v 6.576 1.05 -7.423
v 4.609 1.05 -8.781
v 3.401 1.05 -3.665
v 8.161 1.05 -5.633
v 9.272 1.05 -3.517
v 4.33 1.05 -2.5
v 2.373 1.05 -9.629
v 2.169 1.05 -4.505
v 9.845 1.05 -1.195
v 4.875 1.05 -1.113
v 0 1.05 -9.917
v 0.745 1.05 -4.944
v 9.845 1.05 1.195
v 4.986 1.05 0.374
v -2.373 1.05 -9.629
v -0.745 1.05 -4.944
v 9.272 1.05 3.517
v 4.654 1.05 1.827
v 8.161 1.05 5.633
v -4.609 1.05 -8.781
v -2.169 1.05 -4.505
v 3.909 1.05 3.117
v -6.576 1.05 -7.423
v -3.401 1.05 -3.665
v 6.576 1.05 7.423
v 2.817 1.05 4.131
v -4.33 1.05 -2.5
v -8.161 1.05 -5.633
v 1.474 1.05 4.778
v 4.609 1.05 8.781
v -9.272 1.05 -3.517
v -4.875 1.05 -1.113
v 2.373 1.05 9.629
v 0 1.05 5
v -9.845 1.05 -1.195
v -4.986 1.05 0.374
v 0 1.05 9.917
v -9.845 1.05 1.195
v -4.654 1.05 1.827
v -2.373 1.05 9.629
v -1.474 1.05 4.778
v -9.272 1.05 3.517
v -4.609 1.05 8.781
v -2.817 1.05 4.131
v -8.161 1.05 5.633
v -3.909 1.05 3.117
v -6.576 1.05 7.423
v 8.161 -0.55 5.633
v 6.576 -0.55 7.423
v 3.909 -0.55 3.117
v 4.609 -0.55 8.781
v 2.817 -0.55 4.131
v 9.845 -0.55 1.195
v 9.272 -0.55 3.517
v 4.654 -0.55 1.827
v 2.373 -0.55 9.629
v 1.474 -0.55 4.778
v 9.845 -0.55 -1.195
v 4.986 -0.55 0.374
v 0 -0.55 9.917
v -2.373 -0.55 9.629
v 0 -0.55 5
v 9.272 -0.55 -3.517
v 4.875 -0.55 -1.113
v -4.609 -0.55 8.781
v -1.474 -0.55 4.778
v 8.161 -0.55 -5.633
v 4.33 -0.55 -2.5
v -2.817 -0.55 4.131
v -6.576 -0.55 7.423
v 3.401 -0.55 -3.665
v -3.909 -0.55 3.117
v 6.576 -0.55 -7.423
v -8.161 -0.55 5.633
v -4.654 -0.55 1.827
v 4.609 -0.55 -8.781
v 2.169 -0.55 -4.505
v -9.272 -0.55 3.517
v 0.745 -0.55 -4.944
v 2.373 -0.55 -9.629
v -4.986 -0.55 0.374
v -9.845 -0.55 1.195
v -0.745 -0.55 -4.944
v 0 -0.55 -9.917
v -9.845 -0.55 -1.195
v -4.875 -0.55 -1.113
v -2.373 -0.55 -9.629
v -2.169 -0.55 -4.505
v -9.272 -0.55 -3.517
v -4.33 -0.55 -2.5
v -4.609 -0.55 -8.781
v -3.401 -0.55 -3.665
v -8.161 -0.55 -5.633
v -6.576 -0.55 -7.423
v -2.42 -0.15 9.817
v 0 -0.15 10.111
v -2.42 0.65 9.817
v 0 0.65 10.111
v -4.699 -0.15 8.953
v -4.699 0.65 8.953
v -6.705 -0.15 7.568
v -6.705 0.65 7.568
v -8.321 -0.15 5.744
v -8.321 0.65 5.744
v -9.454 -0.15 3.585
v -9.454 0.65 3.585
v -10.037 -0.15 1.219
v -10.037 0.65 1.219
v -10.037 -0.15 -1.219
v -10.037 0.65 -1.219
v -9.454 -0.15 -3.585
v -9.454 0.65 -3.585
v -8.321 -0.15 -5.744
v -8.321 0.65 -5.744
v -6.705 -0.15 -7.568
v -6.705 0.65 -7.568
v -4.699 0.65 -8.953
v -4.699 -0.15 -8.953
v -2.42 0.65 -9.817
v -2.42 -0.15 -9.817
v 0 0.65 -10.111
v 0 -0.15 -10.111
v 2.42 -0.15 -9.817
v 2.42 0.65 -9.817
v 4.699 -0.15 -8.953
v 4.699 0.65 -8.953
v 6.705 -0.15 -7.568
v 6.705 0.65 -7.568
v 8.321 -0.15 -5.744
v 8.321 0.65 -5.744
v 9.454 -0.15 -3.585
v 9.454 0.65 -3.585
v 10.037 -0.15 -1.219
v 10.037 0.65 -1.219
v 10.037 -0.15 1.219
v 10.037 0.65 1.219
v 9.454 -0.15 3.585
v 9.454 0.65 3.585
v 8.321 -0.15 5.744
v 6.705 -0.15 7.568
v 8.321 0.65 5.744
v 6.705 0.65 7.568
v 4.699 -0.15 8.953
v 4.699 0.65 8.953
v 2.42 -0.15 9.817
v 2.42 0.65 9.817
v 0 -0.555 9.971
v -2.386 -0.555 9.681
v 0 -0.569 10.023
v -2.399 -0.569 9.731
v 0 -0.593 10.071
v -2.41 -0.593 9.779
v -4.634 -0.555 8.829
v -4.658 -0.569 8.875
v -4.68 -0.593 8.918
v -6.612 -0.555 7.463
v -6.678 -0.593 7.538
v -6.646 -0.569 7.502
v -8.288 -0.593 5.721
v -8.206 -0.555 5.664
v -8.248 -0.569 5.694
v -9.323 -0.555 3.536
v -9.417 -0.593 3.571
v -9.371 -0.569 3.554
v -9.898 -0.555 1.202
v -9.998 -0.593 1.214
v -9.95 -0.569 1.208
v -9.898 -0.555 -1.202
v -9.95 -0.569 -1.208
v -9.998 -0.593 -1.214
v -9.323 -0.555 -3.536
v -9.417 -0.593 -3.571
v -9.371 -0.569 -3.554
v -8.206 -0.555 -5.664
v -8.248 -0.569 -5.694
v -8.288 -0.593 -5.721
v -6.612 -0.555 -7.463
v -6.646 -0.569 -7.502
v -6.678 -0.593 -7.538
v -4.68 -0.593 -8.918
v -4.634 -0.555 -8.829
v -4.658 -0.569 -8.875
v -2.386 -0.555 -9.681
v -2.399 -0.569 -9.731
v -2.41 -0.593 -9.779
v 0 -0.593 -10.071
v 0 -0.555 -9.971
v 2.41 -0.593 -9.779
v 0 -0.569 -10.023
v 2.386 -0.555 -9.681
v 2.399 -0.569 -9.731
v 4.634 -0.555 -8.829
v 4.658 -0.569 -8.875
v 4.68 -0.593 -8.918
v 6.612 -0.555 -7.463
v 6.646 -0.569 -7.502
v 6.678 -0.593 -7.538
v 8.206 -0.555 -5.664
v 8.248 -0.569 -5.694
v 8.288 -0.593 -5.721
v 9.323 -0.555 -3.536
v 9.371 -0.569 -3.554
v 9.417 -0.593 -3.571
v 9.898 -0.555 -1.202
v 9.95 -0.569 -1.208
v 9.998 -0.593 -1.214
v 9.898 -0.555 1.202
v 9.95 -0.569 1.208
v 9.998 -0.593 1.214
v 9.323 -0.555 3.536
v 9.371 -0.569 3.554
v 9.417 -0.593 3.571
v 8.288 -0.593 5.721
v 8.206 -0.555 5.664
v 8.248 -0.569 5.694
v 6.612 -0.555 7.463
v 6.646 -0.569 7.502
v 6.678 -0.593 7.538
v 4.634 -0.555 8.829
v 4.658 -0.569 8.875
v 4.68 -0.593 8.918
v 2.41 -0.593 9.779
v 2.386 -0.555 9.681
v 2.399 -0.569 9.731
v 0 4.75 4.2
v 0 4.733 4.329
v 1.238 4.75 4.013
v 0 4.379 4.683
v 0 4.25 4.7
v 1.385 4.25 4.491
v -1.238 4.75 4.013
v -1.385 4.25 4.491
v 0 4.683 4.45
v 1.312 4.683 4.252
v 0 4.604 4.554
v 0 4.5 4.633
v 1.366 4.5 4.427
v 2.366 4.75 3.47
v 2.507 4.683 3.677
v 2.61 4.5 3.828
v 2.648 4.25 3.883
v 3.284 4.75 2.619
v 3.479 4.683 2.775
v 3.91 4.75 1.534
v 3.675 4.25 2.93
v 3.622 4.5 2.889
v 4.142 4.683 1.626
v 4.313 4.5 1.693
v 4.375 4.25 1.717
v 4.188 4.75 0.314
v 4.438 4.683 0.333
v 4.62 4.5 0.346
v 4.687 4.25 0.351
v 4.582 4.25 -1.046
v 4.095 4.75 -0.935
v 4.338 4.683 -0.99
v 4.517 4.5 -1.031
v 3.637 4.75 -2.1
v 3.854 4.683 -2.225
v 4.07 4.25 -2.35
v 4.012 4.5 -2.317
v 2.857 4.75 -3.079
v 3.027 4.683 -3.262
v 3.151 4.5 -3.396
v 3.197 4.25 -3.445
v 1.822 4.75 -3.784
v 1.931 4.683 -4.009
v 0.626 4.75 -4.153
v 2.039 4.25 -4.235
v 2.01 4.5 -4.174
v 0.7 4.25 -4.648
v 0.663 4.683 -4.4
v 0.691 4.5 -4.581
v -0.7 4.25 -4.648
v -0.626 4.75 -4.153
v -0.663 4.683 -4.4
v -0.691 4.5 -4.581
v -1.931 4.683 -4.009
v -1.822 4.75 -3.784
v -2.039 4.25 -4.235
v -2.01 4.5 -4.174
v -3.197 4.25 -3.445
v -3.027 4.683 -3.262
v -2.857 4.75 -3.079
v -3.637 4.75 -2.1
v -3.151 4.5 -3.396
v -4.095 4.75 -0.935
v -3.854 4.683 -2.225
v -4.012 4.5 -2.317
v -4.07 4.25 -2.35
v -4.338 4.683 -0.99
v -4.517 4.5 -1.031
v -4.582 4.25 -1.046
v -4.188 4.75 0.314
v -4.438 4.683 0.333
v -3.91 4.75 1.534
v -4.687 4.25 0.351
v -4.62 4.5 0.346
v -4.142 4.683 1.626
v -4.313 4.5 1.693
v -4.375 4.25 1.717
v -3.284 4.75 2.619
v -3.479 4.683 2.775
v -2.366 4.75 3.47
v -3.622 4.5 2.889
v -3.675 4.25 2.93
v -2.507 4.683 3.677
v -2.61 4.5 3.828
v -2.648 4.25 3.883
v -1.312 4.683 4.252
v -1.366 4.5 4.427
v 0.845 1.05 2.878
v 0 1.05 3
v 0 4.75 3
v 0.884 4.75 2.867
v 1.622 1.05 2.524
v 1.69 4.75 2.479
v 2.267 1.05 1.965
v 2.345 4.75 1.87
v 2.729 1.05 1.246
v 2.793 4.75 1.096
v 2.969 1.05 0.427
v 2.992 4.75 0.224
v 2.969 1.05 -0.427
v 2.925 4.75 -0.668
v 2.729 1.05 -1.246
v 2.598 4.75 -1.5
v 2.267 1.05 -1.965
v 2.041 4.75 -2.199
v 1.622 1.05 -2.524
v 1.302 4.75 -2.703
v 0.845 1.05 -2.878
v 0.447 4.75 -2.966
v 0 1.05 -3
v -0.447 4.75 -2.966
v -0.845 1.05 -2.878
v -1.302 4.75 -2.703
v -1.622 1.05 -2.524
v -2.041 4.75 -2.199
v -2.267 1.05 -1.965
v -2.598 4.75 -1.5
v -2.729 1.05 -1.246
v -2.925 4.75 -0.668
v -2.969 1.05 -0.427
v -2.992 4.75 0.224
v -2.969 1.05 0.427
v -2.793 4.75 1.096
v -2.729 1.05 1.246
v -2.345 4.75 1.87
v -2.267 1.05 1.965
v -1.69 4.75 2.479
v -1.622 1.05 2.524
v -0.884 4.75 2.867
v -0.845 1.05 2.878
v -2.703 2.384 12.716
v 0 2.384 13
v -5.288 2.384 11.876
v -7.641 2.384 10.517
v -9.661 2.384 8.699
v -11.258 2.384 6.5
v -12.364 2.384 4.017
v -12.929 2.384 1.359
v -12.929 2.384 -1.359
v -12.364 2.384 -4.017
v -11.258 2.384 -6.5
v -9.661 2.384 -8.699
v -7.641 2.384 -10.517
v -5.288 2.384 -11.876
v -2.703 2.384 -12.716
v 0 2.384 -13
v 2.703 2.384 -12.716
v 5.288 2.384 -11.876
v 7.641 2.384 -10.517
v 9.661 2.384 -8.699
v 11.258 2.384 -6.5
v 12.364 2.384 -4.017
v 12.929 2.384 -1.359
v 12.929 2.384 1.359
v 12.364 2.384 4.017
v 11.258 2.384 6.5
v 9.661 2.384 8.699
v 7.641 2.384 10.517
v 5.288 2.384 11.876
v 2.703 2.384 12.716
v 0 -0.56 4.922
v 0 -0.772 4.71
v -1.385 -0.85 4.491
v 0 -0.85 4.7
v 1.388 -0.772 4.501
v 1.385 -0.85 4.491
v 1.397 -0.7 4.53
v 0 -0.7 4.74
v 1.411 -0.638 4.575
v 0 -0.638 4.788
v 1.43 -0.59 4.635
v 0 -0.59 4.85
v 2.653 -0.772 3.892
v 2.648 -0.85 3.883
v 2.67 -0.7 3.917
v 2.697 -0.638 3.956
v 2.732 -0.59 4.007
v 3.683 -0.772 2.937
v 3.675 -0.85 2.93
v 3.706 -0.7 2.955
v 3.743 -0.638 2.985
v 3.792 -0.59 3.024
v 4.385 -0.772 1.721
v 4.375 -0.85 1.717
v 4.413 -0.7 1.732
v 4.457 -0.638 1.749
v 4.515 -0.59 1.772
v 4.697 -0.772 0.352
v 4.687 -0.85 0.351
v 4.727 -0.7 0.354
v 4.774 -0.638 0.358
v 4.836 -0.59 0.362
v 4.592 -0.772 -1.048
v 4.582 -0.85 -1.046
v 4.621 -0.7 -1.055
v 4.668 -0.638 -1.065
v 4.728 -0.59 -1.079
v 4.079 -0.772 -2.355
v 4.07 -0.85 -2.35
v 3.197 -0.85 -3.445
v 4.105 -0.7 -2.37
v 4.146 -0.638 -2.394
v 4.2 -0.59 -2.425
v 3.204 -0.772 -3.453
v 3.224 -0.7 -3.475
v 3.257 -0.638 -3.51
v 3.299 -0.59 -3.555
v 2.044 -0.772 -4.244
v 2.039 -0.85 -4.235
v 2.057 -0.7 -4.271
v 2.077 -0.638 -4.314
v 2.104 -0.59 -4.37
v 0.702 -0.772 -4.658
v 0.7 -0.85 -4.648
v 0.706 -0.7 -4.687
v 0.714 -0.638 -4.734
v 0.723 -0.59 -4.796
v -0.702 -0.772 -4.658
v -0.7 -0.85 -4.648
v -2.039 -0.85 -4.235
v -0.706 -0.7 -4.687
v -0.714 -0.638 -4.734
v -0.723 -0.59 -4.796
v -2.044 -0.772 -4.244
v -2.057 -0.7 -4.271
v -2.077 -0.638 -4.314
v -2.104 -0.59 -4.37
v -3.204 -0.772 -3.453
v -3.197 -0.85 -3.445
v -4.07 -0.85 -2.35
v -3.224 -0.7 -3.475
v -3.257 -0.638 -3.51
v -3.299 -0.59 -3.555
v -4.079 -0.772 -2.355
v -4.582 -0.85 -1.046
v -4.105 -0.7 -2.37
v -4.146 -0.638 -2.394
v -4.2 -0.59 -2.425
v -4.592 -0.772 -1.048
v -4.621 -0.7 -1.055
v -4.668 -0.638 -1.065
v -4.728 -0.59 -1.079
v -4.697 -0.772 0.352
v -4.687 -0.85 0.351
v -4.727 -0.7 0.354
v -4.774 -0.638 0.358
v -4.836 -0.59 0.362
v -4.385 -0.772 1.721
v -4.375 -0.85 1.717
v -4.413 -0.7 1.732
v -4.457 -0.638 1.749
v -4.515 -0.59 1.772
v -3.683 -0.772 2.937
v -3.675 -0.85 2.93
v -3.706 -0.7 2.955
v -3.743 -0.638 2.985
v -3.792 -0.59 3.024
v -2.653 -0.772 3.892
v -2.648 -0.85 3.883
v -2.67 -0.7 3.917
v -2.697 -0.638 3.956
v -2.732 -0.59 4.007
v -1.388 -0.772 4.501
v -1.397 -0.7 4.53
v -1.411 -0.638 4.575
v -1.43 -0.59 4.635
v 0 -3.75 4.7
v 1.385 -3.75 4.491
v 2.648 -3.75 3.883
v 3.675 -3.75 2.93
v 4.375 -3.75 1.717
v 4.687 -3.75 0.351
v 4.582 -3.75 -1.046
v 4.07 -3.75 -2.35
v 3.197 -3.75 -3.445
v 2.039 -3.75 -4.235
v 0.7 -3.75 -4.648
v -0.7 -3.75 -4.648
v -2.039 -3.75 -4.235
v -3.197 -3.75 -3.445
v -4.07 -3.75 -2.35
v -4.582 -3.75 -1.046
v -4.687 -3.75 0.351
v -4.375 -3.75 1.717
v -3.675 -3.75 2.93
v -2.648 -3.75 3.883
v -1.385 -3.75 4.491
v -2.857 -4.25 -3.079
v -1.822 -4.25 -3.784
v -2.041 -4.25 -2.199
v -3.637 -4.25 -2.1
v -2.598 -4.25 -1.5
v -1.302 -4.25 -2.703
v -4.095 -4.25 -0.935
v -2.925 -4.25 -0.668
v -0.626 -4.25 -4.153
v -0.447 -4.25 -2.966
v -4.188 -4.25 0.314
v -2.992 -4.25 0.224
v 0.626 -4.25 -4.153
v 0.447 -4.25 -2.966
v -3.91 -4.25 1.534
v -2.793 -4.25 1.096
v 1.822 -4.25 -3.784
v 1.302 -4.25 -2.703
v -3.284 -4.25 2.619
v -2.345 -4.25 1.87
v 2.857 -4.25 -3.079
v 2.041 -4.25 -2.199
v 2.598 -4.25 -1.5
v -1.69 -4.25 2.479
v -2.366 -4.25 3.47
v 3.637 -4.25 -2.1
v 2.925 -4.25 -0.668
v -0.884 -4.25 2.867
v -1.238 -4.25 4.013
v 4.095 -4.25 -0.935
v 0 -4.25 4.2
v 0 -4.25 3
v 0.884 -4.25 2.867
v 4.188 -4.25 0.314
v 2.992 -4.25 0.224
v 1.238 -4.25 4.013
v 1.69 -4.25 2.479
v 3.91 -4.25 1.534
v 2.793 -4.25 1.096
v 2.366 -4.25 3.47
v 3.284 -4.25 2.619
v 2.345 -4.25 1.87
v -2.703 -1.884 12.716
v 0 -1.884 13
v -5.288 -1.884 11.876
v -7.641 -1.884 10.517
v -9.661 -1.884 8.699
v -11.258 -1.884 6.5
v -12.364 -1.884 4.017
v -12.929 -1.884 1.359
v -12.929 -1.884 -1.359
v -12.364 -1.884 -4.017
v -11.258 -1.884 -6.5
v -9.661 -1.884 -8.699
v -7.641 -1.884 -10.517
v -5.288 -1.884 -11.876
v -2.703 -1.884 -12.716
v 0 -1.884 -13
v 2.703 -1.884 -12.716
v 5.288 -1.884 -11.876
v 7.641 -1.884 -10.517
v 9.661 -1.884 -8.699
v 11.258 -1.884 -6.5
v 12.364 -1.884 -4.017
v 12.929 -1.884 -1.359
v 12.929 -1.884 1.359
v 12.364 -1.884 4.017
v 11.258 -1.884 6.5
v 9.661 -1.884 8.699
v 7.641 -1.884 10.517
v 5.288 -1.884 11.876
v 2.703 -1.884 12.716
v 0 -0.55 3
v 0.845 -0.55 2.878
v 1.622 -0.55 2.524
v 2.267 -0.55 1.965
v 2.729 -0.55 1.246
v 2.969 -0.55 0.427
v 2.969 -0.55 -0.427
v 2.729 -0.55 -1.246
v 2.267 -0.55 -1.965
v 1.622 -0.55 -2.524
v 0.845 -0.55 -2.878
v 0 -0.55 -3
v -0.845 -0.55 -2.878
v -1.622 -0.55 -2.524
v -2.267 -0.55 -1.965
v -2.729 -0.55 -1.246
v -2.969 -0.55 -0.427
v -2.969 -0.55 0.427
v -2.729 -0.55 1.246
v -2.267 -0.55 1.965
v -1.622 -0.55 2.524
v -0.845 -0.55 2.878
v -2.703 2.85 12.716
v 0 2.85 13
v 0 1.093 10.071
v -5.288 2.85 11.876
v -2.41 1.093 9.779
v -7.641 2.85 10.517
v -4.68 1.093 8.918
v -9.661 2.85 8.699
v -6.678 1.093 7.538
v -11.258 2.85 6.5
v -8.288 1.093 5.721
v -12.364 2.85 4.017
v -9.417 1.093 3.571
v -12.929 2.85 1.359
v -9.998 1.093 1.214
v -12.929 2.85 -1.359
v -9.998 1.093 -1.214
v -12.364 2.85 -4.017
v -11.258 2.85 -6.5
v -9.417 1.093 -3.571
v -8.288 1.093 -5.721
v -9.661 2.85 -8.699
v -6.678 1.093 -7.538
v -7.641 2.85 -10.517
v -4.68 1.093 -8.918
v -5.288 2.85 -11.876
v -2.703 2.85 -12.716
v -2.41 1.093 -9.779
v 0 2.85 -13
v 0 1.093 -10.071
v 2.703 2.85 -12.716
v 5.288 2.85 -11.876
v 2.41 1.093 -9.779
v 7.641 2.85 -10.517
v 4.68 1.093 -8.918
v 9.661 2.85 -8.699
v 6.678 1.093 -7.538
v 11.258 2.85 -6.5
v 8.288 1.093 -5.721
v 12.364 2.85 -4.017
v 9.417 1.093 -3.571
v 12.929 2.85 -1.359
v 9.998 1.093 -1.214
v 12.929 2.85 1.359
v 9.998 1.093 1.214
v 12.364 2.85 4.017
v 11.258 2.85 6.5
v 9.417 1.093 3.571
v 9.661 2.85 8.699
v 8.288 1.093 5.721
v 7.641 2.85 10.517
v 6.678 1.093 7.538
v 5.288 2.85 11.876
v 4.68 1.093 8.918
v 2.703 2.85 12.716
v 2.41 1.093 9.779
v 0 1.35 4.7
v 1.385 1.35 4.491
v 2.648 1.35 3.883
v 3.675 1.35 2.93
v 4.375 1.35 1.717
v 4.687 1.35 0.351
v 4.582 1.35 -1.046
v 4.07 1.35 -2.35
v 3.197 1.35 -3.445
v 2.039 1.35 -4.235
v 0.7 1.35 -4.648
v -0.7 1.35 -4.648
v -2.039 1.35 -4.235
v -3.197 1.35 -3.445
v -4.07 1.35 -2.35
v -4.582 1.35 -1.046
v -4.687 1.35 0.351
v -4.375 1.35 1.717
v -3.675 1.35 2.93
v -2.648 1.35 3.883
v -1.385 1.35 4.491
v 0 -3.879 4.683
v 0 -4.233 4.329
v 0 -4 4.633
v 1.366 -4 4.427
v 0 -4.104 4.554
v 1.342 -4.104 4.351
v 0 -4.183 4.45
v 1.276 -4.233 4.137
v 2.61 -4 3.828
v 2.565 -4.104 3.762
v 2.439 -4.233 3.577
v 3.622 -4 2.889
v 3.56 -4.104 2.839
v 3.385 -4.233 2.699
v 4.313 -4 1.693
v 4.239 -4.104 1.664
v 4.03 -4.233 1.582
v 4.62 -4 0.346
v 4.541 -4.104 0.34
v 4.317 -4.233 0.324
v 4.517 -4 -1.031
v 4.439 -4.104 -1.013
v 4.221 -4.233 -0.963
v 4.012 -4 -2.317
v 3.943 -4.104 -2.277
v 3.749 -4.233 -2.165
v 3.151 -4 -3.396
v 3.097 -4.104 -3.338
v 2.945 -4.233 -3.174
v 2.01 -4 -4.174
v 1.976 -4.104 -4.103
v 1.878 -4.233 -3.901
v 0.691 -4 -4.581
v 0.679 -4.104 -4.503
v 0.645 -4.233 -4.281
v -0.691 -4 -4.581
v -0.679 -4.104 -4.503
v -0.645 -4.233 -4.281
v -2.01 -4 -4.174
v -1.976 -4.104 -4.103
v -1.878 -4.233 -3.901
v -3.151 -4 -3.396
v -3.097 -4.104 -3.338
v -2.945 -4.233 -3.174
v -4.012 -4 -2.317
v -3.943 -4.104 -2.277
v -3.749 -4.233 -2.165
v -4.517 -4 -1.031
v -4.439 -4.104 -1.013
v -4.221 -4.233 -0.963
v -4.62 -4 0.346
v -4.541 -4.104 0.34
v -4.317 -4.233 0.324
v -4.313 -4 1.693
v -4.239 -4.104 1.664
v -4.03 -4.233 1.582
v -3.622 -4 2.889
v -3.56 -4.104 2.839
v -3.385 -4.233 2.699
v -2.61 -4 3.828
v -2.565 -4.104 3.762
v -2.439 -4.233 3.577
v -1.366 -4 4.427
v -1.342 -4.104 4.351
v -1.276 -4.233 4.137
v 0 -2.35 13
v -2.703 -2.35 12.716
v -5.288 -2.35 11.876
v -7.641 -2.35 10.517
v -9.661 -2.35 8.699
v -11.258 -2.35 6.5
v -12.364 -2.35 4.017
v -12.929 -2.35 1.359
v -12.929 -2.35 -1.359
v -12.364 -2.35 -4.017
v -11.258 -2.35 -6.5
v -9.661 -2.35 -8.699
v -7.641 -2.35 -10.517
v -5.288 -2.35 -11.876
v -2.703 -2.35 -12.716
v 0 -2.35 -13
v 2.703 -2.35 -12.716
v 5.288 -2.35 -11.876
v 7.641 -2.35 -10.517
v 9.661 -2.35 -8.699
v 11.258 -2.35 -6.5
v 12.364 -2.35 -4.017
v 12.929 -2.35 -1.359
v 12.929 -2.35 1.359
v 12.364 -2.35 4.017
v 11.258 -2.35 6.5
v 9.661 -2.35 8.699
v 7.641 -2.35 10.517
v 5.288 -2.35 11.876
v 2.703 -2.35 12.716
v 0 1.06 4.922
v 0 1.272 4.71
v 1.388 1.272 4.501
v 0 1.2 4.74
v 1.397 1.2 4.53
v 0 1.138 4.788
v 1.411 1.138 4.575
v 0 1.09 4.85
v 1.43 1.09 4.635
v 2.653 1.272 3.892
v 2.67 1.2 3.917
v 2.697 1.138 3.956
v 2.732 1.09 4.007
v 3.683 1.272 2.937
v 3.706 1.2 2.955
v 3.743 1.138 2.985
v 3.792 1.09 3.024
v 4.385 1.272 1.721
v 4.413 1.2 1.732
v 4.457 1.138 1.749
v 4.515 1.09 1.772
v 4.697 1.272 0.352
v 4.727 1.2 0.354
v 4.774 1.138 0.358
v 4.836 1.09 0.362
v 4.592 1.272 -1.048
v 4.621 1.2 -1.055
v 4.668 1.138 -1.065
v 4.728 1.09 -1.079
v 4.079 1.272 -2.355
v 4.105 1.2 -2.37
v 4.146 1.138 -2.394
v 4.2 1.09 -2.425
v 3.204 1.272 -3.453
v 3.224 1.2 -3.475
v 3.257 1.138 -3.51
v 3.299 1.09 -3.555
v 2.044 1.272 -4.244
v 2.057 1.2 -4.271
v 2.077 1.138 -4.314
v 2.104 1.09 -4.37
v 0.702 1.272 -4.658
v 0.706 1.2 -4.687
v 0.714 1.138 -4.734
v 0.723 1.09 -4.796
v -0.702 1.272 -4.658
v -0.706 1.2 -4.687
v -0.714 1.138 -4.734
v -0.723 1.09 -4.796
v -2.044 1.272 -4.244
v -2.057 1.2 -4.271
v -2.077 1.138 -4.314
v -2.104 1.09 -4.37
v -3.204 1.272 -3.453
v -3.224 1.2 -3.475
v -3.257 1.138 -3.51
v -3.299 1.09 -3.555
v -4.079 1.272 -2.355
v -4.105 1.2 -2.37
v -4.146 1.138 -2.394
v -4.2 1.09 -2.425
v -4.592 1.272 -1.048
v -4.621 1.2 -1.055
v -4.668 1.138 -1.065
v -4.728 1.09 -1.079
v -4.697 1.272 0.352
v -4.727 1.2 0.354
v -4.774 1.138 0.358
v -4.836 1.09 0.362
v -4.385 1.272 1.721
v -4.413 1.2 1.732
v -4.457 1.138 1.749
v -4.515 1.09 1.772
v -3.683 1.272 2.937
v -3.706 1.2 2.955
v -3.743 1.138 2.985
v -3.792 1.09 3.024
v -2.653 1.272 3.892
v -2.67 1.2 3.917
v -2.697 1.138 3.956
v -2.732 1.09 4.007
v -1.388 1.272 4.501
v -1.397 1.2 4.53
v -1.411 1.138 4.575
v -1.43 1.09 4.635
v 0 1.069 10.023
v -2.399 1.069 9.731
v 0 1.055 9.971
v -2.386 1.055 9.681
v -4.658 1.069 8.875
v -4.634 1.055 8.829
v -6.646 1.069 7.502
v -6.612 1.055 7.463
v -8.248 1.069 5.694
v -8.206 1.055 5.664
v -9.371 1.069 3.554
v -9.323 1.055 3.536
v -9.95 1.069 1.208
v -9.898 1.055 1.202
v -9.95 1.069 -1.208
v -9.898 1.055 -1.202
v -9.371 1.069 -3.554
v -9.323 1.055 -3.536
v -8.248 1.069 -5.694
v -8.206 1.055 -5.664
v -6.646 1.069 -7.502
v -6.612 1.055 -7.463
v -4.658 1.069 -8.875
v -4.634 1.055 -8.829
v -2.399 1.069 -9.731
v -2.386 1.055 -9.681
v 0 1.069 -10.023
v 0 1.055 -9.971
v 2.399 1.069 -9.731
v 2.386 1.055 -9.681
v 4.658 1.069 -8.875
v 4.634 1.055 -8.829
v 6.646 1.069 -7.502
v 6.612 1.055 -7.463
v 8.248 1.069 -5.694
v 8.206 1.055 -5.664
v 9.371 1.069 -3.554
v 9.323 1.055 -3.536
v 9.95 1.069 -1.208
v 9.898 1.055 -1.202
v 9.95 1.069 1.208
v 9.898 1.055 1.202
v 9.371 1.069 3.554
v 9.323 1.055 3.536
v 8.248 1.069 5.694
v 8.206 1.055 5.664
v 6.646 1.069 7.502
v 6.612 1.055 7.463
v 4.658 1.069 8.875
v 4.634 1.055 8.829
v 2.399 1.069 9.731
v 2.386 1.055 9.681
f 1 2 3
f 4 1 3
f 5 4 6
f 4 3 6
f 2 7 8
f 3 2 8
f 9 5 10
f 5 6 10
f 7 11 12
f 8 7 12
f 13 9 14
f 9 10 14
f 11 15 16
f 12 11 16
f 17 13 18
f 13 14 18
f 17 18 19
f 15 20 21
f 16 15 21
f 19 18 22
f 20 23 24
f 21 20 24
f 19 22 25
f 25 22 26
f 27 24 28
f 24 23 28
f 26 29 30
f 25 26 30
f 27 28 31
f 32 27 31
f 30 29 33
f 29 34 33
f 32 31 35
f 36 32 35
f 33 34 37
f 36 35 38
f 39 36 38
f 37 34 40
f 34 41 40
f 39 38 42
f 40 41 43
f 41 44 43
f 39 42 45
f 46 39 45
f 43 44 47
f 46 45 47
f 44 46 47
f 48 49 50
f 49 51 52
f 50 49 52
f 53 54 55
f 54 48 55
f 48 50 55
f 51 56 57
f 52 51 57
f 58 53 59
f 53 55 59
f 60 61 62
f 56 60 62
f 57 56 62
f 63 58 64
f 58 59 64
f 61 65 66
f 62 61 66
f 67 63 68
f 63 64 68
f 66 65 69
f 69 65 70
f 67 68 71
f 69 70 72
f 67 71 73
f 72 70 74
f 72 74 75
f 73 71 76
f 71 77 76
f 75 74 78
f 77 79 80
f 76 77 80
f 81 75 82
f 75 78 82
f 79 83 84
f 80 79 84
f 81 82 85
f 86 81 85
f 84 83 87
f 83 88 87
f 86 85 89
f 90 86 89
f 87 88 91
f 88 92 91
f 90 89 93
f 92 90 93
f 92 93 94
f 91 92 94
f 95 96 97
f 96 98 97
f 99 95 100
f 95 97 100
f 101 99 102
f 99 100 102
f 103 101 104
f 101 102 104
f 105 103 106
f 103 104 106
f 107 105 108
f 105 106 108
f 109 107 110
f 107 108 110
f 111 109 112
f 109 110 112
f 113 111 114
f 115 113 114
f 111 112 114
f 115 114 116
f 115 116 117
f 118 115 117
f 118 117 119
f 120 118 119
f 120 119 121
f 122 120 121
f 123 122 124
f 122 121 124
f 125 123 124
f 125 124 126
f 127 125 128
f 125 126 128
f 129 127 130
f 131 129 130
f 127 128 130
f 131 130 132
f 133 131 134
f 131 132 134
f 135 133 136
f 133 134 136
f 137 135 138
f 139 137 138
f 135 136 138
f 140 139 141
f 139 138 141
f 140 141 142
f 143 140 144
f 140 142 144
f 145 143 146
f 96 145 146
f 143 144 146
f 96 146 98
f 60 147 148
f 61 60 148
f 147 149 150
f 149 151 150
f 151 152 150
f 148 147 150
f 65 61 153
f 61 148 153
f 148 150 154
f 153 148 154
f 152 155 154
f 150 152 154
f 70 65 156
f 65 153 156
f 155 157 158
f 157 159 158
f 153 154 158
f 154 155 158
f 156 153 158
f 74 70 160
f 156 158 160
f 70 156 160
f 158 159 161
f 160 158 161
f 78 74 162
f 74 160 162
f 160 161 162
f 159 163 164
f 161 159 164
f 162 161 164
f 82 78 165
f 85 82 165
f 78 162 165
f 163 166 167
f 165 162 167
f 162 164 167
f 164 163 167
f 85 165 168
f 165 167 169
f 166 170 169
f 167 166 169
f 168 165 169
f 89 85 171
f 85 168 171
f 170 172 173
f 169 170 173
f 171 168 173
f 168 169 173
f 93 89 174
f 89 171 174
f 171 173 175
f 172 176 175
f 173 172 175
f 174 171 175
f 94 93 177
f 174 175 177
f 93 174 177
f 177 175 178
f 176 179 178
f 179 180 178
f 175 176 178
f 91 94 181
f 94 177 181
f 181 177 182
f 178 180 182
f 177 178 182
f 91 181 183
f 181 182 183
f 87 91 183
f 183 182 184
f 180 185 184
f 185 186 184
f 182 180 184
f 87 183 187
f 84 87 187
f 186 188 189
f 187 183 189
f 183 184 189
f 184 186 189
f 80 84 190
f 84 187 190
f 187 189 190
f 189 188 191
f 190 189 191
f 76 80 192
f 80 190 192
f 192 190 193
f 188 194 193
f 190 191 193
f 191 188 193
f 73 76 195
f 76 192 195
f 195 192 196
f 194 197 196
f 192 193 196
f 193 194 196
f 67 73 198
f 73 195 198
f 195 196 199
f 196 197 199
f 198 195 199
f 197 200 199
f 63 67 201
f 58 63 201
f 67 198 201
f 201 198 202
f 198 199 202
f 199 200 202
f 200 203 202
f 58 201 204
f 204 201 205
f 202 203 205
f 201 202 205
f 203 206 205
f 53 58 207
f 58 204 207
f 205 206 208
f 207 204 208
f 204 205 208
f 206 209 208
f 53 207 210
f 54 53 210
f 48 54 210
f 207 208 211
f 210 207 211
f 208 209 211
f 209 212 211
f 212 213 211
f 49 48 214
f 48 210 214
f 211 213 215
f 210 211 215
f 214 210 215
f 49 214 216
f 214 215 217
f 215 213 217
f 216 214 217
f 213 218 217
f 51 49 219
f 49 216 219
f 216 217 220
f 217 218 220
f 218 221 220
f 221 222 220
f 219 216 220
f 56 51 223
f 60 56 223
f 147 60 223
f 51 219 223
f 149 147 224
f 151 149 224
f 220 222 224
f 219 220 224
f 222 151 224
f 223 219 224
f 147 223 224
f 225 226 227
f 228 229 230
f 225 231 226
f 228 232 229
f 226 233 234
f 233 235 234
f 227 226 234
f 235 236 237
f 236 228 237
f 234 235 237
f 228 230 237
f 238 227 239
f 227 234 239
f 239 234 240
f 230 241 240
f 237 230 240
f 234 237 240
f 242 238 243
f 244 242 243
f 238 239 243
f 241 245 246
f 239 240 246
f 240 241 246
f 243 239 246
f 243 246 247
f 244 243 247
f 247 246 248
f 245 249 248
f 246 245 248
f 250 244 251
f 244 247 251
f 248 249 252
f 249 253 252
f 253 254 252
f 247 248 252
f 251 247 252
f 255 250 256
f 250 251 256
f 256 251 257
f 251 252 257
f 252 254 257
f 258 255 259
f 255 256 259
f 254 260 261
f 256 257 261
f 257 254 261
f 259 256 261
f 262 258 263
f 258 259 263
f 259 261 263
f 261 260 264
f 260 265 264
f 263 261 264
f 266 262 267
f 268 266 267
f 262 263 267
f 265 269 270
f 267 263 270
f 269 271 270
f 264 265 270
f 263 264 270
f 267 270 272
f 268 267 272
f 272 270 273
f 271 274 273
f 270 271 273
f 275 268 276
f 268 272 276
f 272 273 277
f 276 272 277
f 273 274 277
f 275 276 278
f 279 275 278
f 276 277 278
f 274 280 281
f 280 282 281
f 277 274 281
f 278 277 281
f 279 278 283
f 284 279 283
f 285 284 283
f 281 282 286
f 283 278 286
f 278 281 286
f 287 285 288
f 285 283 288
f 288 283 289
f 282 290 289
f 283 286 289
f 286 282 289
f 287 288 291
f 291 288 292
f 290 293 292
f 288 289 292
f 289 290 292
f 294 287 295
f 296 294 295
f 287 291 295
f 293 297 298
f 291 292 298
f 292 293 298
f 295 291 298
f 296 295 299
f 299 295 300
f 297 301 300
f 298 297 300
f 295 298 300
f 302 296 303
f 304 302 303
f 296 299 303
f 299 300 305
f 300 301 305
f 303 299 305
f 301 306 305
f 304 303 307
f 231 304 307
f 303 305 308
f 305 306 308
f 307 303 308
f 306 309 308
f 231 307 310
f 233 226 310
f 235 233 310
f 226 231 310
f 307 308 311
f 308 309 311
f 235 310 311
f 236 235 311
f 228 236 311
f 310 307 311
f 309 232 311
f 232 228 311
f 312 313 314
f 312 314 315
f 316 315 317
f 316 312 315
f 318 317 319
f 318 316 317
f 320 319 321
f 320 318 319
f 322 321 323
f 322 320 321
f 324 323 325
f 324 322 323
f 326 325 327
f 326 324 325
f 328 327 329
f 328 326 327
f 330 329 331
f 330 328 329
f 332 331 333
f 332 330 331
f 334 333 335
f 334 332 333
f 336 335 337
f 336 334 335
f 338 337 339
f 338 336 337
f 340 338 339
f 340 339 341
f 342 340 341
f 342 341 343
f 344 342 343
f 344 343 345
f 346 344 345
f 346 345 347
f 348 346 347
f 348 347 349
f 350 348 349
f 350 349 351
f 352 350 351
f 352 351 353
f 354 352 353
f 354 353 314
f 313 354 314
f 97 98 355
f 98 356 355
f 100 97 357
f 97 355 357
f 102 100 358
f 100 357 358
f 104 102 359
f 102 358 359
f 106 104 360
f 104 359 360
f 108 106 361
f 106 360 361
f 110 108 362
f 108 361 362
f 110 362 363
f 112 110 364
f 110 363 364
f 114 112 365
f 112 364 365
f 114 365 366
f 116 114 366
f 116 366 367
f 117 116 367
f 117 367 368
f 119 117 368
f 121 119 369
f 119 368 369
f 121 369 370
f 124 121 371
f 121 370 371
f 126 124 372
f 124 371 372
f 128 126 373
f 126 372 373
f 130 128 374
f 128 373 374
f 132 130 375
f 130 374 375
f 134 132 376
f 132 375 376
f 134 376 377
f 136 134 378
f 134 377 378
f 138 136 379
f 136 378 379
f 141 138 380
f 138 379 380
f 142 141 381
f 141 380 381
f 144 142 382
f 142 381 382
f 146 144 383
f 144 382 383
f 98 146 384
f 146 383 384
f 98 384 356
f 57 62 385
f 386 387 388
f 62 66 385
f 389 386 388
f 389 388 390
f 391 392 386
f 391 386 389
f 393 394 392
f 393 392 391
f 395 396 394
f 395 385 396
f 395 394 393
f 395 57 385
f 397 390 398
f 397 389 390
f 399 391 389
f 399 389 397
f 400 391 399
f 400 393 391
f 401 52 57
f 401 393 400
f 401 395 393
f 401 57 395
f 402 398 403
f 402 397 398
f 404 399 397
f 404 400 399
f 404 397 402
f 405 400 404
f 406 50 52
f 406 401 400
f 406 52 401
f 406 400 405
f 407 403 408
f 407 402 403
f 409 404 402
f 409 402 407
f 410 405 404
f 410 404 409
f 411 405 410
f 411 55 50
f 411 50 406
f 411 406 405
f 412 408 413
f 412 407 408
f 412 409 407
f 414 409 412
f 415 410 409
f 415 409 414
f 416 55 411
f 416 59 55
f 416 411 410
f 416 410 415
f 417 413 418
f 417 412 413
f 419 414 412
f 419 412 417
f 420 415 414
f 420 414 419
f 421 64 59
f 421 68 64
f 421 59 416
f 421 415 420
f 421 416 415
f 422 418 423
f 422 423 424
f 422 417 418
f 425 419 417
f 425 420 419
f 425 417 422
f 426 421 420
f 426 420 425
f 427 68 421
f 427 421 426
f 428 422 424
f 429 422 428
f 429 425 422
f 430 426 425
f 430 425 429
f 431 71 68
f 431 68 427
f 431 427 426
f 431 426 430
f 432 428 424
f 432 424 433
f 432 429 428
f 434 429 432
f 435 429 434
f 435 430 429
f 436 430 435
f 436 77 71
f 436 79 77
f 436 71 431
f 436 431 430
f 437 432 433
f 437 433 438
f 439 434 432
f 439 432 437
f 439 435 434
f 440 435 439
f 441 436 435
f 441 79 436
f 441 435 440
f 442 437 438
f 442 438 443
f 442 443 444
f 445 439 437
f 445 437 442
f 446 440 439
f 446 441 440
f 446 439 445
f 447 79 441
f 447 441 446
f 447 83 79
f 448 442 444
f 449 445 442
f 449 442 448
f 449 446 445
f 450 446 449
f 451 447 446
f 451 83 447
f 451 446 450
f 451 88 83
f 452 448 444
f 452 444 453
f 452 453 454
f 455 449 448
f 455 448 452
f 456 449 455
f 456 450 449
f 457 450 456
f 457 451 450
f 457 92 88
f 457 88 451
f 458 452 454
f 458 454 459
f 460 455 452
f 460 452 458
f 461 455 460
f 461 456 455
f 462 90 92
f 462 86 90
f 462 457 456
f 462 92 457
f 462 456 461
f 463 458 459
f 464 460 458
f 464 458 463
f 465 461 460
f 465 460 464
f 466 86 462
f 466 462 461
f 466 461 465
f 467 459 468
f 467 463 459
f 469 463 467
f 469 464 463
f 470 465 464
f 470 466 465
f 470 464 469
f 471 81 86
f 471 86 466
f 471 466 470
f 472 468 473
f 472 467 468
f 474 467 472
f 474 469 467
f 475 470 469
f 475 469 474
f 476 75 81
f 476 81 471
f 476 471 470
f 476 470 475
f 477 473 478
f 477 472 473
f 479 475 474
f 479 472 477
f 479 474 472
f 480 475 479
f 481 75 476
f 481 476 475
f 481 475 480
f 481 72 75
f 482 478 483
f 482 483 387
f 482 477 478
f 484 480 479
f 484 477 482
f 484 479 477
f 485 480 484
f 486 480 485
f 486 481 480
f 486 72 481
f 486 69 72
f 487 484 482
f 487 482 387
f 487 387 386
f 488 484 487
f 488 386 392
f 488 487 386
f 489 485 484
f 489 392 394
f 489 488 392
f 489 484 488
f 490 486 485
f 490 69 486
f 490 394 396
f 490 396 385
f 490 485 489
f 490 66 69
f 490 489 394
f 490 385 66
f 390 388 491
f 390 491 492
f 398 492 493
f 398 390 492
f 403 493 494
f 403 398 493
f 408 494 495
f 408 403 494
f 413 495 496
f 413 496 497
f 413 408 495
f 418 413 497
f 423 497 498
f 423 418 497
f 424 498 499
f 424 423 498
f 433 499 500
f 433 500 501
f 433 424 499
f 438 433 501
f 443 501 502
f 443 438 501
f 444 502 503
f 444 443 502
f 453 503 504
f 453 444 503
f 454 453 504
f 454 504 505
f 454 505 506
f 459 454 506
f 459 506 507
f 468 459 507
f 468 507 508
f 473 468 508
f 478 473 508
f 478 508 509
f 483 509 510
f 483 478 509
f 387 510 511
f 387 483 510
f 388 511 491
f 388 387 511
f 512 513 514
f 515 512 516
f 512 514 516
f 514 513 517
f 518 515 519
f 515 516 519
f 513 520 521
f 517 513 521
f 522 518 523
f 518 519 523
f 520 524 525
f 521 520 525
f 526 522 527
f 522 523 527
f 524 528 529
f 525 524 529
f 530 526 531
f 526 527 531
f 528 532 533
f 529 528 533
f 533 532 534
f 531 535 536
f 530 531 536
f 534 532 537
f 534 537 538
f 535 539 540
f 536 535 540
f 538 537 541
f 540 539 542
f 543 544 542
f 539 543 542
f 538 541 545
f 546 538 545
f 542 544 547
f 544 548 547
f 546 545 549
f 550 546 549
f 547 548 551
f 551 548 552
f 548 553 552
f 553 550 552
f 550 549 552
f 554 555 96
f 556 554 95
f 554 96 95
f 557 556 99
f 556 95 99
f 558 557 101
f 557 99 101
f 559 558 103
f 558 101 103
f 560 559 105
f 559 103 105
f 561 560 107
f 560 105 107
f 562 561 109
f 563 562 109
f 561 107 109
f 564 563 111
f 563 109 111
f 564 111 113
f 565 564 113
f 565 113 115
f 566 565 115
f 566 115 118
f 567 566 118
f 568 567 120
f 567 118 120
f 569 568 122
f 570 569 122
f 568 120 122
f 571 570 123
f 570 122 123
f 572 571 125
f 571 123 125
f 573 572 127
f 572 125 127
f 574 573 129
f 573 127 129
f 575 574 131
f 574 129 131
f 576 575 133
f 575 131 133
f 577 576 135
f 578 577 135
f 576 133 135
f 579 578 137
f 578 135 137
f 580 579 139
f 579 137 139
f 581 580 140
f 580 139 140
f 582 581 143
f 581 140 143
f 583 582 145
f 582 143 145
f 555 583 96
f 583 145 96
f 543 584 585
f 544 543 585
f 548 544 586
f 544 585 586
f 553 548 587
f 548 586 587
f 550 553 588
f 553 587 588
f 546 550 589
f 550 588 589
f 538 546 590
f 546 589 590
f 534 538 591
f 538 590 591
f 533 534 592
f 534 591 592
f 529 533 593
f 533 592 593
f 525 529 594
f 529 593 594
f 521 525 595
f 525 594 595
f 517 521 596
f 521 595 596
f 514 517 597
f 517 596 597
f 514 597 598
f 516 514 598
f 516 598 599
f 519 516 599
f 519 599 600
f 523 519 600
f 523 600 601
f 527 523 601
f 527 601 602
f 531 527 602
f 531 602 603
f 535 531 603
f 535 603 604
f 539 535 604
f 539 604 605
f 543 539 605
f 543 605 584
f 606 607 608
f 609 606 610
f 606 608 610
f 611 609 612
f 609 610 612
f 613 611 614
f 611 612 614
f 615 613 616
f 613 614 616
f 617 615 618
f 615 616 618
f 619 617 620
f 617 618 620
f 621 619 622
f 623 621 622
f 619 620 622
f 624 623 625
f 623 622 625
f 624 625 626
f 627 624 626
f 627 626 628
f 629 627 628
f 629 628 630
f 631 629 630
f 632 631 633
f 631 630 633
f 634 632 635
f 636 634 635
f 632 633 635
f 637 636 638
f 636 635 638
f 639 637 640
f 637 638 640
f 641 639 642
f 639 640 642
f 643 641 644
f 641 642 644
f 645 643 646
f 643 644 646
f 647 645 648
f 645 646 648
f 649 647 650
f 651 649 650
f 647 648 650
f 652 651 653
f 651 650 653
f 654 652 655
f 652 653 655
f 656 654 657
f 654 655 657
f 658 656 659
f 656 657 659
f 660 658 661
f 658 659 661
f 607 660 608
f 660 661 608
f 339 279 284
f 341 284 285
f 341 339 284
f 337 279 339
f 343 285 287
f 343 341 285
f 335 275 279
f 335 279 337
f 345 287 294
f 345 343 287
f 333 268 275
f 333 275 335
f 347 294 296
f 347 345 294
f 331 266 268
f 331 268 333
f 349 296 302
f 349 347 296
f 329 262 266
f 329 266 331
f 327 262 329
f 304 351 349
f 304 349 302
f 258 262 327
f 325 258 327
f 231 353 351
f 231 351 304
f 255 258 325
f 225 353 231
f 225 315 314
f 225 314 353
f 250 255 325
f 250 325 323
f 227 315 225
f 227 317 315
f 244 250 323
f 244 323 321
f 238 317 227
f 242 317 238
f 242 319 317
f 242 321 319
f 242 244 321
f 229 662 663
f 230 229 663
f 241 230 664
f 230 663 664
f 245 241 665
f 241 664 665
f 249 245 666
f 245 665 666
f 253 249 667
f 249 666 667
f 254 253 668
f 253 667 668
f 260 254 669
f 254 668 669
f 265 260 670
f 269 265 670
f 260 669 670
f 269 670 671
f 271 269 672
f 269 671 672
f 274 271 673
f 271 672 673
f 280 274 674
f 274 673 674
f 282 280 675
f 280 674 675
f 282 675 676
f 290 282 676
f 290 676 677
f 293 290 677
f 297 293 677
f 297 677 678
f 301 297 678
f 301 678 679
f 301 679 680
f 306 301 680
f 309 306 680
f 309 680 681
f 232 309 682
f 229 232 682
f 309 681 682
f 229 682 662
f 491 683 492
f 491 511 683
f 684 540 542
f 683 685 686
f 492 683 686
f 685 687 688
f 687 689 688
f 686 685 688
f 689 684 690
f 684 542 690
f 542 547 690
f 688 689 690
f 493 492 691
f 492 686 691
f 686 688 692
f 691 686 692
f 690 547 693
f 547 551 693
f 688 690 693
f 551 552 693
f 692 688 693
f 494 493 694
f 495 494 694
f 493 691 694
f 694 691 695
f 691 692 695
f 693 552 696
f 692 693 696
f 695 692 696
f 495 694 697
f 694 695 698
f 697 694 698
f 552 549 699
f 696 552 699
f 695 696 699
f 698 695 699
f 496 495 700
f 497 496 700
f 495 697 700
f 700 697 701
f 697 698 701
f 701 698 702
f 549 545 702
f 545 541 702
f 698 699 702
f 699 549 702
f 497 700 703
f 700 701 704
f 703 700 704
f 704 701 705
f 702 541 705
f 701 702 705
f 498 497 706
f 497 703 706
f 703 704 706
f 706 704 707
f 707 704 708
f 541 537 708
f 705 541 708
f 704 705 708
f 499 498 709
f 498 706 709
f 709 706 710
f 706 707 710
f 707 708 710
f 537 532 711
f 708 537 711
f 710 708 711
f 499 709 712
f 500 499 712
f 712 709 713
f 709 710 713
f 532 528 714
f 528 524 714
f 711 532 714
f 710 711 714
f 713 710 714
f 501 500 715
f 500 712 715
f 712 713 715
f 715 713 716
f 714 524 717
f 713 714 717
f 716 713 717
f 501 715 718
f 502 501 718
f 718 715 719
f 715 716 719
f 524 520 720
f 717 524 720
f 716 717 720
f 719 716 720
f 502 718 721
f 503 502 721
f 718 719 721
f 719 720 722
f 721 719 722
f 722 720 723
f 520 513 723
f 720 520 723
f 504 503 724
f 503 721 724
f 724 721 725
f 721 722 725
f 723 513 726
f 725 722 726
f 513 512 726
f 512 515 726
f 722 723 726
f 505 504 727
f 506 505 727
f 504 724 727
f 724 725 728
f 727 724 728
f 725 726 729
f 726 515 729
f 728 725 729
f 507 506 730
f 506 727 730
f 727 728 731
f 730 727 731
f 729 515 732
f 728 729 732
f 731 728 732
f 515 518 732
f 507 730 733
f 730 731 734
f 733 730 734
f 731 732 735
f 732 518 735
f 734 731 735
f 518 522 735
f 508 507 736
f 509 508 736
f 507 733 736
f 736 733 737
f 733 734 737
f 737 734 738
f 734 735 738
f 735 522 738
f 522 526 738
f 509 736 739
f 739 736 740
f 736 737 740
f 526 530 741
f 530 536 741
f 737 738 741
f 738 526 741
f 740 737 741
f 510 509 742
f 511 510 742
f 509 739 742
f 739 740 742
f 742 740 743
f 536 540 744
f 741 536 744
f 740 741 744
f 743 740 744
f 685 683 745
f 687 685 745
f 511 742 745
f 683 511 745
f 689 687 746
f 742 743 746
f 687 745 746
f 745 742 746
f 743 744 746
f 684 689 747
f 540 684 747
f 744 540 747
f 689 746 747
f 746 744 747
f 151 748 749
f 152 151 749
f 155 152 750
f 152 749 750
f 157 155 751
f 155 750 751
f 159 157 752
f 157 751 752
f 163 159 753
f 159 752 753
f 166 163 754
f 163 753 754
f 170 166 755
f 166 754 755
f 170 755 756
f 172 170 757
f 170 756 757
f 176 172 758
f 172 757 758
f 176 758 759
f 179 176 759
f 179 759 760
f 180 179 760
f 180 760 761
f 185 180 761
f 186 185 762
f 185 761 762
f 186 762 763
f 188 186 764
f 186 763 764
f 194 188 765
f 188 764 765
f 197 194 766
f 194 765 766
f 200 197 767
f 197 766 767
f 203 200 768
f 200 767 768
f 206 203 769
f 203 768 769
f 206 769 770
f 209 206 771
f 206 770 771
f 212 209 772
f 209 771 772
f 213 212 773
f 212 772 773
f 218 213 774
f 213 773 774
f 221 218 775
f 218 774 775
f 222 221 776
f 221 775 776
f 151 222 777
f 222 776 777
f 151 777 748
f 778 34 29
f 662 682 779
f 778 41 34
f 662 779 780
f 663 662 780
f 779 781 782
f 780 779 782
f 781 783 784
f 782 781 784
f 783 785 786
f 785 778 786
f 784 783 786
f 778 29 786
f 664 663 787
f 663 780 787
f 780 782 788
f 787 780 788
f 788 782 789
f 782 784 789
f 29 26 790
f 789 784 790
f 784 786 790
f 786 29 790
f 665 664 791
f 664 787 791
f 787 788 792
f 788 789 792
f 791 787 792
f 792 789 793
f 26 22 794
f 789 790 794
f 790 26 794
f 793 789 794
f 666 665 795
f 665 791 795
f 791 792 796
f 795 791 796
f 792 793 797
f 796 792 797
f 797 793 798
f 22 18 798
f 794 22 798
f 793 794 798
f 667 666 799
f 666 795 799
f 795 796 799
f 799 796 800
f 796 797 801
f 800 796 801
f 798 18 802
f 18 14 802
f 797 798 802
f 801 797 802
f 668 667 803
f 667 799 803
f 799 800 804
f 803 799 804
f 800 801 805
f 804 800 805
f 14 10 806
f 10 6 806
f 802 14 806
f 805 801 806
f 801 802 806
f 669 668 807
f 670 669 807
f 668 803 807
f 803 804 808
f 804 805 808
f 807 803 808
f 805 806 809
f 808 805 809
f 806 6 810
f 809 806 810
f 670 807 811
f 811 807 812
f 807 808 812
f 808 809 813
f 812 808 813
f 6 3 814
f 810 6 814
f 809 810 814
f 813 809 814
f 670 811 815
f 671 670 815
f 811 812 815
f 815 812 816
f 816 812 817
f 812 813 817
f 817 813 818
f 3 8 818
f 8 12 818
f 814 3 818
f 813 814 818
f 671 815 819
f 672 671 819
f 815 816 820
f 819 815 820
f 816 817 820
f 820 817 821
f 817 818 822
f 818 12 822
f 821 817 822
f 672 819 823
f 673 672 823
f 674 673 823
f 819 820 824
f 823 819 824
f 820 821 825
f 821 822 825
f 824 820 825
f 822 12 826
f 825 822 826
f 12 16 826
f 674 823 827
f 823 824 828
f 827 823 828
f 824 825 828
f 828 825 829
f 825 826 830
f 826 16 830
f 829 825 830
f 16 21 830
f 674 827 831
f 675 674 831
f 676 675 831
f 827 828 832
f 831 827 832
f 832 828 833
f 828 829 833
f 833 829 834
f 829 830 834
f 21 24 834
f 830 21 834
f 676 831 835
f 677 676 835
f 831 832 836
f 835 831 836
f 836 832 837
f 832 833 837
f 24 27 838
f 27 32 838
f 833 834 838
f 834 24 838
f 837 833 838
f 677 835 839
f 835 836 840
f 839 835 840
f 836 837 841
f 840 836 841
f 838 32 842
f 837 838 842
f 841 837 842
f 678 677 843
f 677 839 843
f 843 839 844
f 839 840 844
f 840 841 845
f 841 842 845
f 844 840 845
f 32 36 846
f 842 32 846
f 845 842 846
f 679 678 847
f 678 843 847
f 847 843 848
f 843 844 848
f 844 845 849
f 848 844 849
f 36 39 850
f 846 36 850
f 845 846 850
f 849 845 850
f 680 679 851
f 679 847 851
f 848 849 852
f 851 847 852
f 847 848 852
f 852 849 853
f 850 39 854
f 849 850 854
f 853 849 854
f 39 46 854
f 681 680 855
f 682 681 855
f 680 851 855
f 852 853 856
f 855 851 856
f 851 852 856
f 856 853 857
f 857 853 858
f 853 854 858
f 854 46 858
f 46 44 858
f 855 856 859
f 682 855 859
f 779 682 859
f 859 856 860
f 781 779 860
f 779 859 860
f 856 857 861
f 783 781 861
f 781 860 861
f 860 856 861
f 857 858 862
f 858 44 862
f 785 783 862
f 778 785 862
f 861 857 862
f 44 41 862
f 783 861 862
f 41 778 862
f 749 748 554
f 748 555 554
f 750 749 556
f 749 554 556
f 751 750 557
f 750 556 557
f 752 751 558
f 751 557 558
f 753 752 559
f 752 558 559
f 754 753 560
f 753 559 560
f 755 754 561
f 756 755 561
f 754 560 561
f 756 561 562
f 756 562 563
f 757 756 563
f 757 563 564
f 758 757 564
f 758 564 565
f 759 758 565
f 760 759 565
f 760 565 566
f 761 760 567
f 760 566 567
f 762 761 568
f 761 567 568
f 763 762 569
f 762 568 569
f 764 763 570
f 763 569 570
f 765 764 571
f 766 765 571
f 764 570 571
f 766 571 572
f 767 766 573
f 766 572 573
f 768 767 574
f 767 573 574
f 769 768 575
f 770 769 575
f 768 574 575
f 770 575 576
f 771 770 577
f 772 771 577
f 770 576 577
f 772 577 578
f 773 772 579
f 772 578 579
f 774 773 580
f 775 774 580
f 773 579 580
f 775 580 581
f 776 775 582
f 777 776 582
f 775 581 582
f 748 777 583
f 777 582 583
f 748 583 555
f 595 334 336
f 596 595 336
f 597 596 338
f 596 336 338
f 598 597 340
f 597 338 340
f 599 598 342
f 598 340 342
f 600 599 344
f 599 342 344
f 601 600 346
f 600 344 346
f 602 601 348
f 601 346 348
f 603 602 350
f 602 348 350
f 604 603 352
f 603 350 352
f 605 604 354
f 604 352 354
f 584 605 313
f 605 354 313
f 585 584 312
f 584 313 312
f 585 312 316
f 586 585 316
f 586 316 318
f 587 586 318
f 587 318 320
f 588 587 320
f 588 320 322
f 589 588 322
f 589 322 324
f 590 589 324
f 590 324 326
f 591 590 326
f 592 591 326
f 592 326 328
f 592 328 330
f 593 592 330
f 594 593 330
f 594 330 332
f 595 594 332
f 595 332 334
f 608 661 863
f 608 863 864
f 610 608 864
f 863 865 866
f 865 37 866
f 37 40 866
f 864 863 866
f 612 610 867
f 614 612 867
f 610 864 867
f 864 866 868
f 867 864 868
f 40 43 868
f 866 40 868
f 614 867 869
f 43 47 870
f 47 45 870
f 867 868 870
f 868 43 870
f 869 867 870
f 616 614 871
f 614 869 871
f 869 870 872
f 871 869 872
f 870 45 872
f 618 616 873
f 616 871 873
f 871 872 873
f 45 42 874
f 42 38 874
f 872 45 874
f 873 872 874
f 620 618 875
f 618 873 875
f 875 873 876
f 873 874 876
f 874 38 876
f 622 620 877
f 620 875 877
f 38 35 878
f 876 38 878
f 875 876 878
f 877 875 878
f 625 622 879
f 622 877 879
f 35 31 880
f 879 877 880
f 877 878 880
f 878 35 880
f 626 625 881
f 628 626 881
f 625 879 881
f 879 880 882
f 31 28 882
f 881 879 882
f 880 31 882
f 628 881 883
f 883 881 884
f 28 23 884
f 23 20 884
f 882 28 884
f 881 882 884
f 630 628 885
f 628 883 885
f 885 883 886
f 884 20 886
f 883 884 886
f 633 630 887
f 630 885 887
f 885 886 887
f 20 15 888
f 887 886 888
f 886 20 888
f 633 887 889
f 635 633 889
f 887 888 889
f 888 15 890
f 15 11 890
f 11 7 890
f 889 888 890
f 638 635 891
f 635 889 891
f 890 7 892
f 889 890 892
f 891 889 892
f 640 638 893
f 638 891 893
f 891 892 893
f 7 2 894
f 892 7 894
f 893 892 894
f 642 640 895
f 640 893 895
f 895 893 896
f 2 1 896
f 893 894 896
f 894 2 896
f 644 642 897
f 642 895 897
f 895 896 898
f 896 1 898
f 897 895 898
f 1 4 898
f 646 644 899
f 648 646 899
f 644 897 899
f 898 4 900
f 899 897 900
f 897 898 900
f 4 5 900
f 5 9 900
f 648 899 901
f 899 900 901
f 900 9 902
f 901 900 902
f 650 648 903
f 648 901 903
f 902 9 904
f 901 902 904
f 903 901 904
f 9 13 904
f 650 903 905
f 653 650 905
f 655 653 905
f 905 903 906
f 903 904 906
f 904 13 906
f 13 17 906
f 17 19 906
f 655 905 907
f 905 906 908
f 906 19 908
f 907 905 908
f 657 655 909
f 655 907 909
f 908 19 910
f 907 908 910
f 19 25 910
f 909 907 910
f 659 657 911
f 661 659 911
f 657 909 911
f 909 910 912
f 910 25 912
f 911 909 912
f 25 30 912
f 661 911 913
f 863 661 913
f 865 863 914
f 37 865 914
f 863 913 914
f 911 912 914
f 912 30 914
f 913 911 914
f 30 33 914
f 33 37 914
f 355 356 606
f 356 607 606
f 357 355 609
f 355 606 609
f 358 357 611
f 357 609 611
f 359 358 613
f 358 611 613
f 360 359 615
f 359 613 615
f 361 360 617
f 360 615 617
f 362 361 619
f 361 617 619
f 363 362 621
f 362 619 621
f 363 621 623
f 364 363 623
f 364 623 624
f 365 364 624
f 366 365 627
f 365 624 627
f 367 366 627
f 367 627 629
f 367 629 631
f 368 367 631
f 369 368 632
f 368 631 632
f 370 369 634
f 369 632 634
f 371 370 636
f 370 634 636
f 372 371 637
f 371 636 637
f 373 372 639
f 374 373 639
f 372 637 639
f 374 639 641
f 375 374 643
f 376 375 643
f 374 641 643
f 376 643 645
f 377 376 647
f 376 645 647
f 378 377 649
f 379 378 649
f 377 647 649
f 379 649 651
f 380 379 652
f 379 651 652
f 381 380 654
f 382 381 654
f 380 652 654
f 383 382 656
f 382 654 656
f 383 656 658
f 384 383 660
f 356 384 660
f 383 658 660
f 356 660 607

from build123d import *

# Parameters (mm, degrees)
SKETCH2_R           = 4.7
SKETCH2_R_2         = 3
BOSS_EXTRUDE1_DEPTH = 3.7
SKETCH3_R           = 3
CUT_EXTRUDE1_DEPTH  = 19.753399692
FILLET1_R           = 0.5
FILLET2_R           = 0.3


with BuildPart() as part:
    # Sketch1 → Revolve1 (revolve)
    with BuildSketch(Plane(origin=(0, 0, 0), x_dir=(0, 0, -1), z_dir=(1, 0, 0))):
        Polygon((-13, -2.35), (-13, -1.883523848), (-10.110793586, -0.15), (-10.110793586, 0.65), (-13, 2.383523848), (-13, 2.85), (-10, 1.05), (0, 1.05), (0, -0.55), (-10, -0.55), align=None)
    revolve(axis=Axis((0, 0, 0), (0, -1, 0)))

    # Sketch2 → Boss-Extrude1 (add)
    with BuildSketch(Plane(origin=(0, 1.05, 0), x_dir=(1, 0, 0), z_dir=(0, 1, 0))):
        with Locations(Location((0, 0, 0), (0, 0, 270))):
            Circle(SKETCH2_R)
        with Locations(Location((0, 0, 0), (0, 0, 270))):
            Circle(SKETCH2_R_2, mode=Mode.SUBTRACT)
    boss_extrude1 = extrude(amount=BOSS_EXTRUDE1_DEPTH)

    # Sketch3 → Cut-Extrude1 (cut, through all)
    with BuildSketch(Plane(origin=(0, 1.05, 0), x_dir=(1, 0, 0), z_dir=(0, 1, 0))):
        with Locations(Location((0, 0, 0), (0, 0, 90))):
            Circle(SKETCH3_R)
    extrude(amount=-CUT_EXTRUDE1_DEPTH, mode=Mode.SUBTRACT)

    # Mirror1: Boss-Extrude1 across plane
    add(boss_extrude1.mirror(Plane.ZX.offset(0.25)))

    # Fillet1
    fillet1_edges = [part.edges().sort_by_distance(p)[0] for p in [
        (0, 4.75, -4.7),
        (0, -4.25, -4.7),
    ]]
    fillet(fillet1_edges, radius=FILLET1_R)

    # Fillet2
    fillet2_edges = [part.edges().sort_by_distance(p)[0] for p in [
        (0, 1.05, -4.7),
        (0, -0.55, -4.7),
        (0, 1.05, -10),
        (0, -0.55, -10),
    ]]
    fillet(fillet2_edges, radius=FILLET2_R)


solid = part.part
